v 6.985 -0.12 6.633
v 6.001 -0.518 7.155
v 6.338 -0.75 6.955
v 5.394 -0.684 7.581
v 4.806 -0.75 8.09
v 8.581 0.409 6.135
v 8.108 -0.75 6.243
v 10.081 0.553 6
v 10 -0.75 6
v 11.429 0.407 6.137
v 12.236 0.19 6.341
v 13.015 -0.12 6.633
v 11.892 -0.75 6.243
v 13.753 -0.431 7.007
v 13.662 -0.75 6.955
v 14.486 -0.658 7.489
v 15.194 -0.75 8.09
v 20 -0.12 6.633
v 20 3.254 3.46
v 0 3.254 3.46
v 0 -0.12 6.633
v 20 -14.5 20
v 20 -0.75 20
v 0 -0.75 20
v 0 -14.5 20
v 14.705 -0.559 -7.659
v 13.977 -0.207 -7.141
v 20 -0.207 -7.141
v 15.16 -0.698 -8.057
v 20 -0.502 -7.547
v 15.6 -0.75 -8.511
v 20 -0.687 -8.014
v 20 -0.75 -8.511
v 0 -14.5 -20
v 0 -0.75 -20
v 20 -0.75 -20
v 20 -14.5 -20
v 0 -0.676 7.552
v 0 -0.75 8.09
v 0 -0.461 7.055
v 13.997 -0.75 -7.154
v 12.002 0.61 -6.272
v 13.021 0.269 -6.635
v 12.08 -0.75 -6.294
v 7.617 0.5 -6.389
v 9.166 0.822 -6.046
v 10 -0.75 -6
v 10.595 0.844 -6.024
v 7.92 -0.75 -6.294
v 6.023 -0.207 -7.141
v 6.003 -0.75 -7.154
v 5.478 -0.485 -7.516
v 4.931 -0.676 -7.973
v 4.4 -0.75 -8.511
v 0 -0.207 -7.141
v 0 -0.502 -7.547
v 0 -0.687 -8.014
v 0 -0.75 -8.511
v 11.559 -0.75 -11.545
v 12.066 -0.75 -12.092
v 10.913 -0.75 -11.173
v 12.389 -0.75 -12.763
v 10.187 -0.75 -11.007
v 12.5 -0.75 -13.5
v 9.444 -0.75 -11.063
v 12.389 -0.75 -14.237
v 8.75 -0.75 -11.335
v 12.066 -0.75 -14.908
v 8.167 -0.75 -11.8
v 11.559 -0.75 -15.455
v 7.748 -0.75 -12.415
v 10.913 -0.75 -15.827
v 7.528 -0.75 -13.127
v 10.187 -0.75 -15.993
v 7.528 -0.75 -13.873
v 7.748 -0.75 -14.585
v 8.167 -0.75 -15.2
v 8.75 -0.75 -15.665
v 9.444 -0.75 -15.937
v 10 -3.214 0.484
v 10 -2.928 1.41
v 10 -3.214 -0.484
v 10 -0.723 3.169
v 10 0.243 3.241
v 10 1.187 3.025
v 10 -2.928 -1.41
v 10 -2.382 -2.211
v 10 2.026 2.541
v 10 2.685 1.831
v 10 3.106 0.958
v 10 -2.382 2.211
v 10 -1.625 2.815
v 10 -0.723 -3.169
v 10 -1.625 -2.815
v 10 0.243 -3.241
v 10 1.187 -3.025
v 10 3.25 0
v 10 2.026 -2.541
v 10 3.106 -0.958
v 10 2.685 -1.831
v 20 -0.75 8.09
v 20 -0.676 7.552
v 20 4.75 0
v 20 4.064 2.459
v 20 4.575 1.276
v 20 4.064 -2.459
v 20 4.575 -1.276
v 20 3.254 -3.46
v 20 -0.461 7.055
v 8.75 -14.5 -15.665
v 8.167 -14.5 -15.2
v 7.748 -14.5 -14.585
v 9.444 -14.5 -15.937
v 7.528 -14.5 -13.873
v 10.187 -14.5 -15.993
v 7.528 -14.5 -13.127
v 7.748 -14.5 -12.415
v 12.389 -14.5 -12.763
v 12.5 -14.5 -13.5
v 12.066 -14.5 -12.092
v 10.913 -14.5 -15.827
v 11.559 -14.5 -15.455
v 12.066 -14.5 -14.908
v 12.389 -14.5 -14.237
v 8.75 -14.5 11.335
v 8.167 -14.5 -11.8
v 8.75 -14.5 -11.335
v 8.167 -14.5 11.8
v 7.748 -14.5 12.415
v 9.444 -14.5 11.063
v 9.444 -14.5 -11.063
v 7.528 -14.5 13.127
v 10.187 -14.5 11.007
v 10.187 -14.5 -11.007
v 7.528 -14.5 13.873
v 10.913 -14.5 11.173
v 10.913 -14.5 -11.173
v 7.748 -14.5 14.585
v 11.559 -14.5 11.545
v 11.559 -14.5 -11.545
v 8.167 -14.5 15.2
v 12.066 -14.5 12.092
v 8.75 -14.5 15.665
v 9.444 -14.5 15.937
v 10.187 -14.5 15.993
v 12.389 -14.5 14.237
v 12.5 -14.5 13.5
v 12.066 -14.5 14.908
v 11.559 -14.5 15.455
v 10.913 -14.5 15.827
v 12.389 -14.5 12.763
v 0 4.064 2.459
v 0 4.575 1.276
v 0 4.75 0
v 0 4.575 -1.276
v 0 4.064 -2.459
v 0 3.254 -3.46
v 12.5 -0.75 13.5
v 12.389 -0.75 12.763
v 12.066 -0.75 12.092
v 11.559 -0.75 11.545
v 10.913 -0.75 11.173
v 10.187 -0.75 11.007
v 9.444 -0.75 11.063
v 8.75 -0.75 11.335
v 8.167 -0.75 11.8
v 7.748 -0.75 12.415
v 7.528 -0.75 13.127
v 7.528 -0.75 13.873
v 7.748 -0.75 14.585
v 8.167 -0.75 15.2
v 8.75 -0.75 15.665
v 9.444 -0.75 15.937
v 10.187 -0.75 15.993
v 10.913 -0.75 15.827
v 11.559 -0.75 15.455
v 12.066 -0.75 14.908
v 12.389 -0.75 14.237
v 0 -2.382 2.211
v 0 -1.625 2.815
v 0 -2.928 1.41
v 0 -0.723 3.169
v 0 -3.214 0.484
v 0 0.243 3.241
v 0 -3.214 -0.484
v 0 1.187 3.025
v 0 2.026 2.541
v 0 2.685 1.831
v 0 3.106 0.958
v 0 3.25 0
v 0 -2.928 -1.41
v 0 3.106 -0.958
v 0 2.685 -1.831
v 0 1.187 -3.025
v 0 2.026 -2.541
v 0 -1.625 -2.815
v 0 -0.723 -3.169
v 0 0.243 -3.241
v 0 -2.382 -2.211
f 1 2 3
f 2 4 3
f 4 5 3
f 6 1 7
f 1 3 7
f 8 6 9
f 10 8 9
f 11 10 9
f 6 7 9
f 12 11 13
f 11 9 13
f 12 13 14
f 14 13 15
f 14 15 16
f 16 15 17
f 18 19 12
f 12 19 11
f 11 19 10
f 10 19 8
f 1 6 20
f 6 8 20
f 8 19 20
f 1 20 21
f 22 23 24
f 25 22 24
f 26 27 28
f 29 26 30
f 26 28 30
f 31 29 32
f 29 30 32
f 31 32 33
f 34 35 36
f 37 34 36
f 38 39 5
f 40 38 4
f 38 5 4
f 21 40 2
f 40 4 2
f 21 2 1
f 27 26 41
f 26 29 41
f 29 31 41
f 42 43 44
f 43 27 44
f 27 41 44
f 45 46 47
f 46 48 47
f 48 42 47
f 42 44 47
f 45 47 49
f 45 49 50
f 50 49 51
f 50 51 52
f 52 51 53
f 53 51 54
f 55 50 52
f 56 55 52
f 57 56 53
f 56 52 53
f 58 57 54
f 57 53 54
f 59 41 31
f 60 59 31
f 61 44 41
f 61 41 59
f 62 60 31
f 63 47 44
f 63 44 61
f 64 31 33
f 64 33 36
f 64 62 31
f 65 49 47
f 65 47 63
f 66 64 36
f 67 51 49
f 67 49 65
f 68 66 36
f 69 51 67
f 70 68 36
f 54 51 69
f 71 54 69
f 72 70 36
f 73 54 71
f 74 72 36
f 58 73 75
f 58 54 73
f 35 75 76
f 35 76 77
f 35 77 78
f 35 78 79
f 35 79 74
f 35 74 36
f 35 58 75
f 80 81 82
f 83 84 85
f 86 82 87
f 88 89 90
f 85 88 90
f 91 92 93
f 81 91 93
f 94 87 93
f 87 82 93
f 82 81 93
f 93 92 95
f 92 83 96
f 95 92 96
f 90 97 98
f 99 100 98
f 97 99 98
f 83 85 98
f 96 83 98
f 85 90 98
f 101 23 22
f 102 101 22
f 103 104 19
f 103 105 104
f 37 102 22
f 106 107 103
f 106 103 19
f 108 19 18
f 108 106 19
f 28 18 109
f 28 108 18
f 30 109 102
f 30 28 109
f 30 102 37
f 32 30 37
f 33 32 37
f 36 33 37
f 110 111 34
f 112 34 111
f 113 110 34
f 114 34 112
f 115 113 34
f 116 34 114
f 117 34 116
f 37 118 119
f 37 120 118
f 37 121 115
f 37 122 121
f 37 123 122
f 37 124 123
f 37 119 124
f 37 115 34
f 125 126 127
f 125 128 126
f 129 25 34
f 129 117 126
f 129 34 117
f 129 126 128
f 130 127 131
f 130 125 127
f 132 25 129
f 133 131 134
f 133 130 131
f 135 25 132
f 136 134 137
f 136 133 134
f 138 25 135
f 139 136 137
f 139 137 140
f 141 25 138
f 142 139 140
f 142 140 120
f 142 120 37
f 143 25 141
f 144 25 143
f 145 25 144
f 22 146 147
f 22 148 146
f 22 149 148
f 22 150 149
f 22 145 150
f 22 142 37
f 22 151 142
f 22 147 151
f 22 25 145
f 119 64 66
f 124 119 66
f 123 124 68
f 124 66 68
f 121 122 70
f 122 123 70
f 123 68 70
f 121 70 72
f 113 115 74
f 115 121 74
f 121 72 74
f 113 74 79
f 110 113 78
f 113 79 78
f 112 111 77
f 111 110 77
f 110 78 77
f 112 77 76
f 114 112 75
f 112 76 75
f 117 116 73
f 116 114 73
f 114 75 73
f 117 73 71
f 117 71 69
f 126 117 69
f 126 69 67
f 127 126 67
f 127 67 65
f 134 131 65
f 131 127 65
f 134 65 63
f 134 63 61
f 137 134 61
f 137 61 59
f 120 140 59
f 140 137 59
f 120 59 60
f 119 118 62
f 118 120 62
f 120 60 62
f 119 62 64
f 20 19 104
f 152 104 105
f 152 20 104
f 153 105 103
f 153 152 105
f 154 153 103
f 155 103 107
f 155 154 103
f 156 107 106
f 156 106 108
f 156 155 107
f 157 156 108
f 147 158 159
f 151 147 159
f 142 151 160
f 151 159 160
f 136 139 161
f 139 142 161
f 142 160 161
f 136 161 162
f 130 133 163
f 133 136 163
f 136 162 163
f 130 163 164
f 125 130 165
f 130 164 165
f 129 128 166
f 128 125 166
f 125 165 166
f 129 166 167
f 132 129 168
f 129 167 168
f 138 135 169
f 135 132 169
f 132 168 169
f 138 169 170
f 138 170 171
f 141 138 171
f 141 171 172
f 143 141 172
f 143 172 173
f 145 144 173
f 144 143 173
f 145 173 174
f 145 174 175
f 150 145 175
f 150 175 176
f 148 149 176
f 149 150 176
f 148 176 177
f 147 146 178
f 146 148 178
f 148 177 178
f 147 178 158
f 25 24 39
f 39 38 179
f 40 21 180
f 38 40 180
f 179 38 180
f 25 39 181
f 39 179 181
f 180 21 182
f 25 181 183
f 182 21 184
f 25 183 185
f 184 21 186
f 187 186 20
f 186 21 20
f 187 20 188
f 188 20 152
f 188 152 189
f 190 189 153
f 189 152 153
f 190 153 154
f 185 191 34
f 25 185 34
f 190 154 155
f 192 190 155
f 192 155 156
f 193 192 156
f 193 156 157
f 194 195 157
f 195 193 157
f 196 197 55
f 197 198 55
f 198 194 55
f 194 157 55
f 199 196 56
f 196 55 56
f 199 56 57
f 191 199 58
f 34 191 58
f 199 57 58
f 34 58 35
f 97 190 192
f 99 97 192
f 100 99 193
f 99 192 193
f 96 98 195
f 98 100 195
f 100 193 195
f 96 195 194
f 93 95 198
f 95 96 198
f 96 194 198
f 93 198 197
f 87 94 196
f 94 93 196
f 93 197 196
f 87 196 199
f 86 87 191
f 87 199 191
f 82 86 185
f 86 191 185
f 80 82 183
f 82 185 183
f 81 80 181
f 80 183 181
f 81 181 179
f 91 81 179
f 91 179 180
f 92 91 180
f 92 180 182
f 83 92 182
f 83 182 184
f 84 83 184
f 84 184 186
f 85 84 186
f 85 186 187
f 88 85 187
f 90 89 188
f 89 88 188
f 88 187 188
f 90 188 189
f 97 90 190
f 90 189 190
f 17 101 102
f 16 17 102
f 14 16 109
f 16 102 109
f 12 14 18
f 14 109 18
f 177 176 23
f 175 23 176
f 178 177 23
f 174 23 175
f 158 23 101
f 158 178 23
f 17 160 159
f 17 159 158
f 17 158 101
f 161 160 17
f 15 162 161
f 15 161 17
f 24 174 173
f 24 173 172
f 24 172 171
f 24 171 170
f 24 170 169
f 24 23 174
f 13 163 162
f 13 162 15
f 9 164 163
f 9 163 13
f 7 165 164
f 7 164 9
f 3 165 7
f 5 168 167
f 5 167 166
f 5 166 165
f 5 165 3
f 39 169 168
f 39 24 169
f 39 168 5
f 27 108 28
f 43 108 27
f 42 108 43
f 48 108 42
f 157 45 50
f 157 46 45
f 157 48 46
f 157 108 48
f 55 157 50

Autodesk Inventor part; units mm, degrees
ref_plane "YZ Plane" through (0, 0, 0) normal (1, 0, 0) x (0, 1, 0)
ref_plane "XZ Plane" through (0, 0, 0) normal (0, 1, 0) x (-1, 0, 0)
ref_plane "XY Plane" through (0, 0, 0) normal (0, 0, 1) x (1, 0, 0)
sketch "Sketch1" plane through (0, 0, 0) normal (1, 0, 0) x (0, 1, 0)
  circle A0 centre (0, 0) radius 3.25
  circle A1 centre (0, 0) radius 4.75
  line L0 (-4.75, 0) -> (-4.75, -20)
  line L1 (-4.75, 0) -> (-4.75, 20)
  line L2 (-4.75, 20) -> (-0.75, 20)
  line L3 (-0.75, 20) -> (-0.75, 4.6904)
  line L4 (-0.75, -4.6904) -> (-0.75, -20)
  line L5 (-4.75, -20) -> (-0.75, -20)
  line L6 (3.2538, 3.4605) -> (-0.75, 7.2252)
  line L7 (3.2538, -3.4605) -> (-0.75, -7.7187)
  dimension "d0" = 6.5
  dimension "d1" = 9.5
  dimension "d2" = 20
  dimension "d3" = 20
  dimension "d4" = 4
extrude "Extrusion1" add sketch "Sketch1" along normal blind 20
sketch "Sketch3" plane through (0, -0.75, 20) normal (0, 1, 0) x (1, 0, 0)
  line L0 (0, 0) -> (0, 40) projected
  line L1 (0, 0) -> (10, 0)
  line L2 (0, 0) -> (20, 0) projected
  line L3 (10, 0) -> (10, 6.5)
  line L4 (0, 40) -> (20, 40) projected
  line L5 (0, 40) -> (10, 40)
  line L6 (10, 40) -> (10, 33.5)
  circle A0 centre (10, 6.5) radius 2.5
  circle A1 centre (10, 33.5) radius 2.5
  point P0 (0, 20)
  dimension "d7" = 6.5
  dimension "d8" = 6.5
  dimension "d9" = 5
  dimension "d10" = 5
extrude "Extrusion2" cut sketch "Sketch3" against normal blind 20
fillet "Fillet1" radius 2 2 edges at (10, -0.75, 7.2252) (10, -0.75, -7.7187)
sketch "Sketch4" plane through (20, 0, 0) normal (1, 0, 0) x (0, 0, -1)
  circle A0 centre (0, 0) radius 3.25
extrude "Extrusion3" add sketch "Sketch4" against normal blind 10
sketch "Sketch5" plane through (0, -4.75, -20) normal (0, -1, 0) x (1, 0, 0)
  line L0 (0, 0) -> (20, 0) projected
  line L1 (20, 40) -> (20, 0) projected
  line L2 (0, 0) -> (20, 0)
  line L3 (20, 0) -> (20, 40)
  line L4 (20, 40) -> (0, 40)
  line L5 (0, 40) -> (0, 0)
  circle A0 centre (10, 6.5) radius 2.5 projected
  circle A1 centre (10, 6.5) radius 2.5
  circle A2 centre (10, 33.5) radius 2.5 projected
  circle A3 centre (10, 33.5) radius 2.5
  point P0 (0, 20)
extrude "Extrusion4" add sketch "Sketch5" along normal blind 9.75
sketch "Sketch6" plane through (0, -0.75, -20) normal (0, 1, 0) x (1, 0, 0)
  circle A0 centre (10, -6.5) radius 2.5 projected
  circle A1 centre (10, -6.5) radius 7.5
  circle A2 centre (10, -33.5) radius 2.5 projected
  circle A3 centre (10, -33.5) radius 7.5
  point P0 (0, -20)
  dimension "d18" = 15
  dimension "d19" = 15
extrude "Extrusion5" cut sketch "Sketch6" along normal blind 9.75
properties part number "linac_lower_ax_mount"
